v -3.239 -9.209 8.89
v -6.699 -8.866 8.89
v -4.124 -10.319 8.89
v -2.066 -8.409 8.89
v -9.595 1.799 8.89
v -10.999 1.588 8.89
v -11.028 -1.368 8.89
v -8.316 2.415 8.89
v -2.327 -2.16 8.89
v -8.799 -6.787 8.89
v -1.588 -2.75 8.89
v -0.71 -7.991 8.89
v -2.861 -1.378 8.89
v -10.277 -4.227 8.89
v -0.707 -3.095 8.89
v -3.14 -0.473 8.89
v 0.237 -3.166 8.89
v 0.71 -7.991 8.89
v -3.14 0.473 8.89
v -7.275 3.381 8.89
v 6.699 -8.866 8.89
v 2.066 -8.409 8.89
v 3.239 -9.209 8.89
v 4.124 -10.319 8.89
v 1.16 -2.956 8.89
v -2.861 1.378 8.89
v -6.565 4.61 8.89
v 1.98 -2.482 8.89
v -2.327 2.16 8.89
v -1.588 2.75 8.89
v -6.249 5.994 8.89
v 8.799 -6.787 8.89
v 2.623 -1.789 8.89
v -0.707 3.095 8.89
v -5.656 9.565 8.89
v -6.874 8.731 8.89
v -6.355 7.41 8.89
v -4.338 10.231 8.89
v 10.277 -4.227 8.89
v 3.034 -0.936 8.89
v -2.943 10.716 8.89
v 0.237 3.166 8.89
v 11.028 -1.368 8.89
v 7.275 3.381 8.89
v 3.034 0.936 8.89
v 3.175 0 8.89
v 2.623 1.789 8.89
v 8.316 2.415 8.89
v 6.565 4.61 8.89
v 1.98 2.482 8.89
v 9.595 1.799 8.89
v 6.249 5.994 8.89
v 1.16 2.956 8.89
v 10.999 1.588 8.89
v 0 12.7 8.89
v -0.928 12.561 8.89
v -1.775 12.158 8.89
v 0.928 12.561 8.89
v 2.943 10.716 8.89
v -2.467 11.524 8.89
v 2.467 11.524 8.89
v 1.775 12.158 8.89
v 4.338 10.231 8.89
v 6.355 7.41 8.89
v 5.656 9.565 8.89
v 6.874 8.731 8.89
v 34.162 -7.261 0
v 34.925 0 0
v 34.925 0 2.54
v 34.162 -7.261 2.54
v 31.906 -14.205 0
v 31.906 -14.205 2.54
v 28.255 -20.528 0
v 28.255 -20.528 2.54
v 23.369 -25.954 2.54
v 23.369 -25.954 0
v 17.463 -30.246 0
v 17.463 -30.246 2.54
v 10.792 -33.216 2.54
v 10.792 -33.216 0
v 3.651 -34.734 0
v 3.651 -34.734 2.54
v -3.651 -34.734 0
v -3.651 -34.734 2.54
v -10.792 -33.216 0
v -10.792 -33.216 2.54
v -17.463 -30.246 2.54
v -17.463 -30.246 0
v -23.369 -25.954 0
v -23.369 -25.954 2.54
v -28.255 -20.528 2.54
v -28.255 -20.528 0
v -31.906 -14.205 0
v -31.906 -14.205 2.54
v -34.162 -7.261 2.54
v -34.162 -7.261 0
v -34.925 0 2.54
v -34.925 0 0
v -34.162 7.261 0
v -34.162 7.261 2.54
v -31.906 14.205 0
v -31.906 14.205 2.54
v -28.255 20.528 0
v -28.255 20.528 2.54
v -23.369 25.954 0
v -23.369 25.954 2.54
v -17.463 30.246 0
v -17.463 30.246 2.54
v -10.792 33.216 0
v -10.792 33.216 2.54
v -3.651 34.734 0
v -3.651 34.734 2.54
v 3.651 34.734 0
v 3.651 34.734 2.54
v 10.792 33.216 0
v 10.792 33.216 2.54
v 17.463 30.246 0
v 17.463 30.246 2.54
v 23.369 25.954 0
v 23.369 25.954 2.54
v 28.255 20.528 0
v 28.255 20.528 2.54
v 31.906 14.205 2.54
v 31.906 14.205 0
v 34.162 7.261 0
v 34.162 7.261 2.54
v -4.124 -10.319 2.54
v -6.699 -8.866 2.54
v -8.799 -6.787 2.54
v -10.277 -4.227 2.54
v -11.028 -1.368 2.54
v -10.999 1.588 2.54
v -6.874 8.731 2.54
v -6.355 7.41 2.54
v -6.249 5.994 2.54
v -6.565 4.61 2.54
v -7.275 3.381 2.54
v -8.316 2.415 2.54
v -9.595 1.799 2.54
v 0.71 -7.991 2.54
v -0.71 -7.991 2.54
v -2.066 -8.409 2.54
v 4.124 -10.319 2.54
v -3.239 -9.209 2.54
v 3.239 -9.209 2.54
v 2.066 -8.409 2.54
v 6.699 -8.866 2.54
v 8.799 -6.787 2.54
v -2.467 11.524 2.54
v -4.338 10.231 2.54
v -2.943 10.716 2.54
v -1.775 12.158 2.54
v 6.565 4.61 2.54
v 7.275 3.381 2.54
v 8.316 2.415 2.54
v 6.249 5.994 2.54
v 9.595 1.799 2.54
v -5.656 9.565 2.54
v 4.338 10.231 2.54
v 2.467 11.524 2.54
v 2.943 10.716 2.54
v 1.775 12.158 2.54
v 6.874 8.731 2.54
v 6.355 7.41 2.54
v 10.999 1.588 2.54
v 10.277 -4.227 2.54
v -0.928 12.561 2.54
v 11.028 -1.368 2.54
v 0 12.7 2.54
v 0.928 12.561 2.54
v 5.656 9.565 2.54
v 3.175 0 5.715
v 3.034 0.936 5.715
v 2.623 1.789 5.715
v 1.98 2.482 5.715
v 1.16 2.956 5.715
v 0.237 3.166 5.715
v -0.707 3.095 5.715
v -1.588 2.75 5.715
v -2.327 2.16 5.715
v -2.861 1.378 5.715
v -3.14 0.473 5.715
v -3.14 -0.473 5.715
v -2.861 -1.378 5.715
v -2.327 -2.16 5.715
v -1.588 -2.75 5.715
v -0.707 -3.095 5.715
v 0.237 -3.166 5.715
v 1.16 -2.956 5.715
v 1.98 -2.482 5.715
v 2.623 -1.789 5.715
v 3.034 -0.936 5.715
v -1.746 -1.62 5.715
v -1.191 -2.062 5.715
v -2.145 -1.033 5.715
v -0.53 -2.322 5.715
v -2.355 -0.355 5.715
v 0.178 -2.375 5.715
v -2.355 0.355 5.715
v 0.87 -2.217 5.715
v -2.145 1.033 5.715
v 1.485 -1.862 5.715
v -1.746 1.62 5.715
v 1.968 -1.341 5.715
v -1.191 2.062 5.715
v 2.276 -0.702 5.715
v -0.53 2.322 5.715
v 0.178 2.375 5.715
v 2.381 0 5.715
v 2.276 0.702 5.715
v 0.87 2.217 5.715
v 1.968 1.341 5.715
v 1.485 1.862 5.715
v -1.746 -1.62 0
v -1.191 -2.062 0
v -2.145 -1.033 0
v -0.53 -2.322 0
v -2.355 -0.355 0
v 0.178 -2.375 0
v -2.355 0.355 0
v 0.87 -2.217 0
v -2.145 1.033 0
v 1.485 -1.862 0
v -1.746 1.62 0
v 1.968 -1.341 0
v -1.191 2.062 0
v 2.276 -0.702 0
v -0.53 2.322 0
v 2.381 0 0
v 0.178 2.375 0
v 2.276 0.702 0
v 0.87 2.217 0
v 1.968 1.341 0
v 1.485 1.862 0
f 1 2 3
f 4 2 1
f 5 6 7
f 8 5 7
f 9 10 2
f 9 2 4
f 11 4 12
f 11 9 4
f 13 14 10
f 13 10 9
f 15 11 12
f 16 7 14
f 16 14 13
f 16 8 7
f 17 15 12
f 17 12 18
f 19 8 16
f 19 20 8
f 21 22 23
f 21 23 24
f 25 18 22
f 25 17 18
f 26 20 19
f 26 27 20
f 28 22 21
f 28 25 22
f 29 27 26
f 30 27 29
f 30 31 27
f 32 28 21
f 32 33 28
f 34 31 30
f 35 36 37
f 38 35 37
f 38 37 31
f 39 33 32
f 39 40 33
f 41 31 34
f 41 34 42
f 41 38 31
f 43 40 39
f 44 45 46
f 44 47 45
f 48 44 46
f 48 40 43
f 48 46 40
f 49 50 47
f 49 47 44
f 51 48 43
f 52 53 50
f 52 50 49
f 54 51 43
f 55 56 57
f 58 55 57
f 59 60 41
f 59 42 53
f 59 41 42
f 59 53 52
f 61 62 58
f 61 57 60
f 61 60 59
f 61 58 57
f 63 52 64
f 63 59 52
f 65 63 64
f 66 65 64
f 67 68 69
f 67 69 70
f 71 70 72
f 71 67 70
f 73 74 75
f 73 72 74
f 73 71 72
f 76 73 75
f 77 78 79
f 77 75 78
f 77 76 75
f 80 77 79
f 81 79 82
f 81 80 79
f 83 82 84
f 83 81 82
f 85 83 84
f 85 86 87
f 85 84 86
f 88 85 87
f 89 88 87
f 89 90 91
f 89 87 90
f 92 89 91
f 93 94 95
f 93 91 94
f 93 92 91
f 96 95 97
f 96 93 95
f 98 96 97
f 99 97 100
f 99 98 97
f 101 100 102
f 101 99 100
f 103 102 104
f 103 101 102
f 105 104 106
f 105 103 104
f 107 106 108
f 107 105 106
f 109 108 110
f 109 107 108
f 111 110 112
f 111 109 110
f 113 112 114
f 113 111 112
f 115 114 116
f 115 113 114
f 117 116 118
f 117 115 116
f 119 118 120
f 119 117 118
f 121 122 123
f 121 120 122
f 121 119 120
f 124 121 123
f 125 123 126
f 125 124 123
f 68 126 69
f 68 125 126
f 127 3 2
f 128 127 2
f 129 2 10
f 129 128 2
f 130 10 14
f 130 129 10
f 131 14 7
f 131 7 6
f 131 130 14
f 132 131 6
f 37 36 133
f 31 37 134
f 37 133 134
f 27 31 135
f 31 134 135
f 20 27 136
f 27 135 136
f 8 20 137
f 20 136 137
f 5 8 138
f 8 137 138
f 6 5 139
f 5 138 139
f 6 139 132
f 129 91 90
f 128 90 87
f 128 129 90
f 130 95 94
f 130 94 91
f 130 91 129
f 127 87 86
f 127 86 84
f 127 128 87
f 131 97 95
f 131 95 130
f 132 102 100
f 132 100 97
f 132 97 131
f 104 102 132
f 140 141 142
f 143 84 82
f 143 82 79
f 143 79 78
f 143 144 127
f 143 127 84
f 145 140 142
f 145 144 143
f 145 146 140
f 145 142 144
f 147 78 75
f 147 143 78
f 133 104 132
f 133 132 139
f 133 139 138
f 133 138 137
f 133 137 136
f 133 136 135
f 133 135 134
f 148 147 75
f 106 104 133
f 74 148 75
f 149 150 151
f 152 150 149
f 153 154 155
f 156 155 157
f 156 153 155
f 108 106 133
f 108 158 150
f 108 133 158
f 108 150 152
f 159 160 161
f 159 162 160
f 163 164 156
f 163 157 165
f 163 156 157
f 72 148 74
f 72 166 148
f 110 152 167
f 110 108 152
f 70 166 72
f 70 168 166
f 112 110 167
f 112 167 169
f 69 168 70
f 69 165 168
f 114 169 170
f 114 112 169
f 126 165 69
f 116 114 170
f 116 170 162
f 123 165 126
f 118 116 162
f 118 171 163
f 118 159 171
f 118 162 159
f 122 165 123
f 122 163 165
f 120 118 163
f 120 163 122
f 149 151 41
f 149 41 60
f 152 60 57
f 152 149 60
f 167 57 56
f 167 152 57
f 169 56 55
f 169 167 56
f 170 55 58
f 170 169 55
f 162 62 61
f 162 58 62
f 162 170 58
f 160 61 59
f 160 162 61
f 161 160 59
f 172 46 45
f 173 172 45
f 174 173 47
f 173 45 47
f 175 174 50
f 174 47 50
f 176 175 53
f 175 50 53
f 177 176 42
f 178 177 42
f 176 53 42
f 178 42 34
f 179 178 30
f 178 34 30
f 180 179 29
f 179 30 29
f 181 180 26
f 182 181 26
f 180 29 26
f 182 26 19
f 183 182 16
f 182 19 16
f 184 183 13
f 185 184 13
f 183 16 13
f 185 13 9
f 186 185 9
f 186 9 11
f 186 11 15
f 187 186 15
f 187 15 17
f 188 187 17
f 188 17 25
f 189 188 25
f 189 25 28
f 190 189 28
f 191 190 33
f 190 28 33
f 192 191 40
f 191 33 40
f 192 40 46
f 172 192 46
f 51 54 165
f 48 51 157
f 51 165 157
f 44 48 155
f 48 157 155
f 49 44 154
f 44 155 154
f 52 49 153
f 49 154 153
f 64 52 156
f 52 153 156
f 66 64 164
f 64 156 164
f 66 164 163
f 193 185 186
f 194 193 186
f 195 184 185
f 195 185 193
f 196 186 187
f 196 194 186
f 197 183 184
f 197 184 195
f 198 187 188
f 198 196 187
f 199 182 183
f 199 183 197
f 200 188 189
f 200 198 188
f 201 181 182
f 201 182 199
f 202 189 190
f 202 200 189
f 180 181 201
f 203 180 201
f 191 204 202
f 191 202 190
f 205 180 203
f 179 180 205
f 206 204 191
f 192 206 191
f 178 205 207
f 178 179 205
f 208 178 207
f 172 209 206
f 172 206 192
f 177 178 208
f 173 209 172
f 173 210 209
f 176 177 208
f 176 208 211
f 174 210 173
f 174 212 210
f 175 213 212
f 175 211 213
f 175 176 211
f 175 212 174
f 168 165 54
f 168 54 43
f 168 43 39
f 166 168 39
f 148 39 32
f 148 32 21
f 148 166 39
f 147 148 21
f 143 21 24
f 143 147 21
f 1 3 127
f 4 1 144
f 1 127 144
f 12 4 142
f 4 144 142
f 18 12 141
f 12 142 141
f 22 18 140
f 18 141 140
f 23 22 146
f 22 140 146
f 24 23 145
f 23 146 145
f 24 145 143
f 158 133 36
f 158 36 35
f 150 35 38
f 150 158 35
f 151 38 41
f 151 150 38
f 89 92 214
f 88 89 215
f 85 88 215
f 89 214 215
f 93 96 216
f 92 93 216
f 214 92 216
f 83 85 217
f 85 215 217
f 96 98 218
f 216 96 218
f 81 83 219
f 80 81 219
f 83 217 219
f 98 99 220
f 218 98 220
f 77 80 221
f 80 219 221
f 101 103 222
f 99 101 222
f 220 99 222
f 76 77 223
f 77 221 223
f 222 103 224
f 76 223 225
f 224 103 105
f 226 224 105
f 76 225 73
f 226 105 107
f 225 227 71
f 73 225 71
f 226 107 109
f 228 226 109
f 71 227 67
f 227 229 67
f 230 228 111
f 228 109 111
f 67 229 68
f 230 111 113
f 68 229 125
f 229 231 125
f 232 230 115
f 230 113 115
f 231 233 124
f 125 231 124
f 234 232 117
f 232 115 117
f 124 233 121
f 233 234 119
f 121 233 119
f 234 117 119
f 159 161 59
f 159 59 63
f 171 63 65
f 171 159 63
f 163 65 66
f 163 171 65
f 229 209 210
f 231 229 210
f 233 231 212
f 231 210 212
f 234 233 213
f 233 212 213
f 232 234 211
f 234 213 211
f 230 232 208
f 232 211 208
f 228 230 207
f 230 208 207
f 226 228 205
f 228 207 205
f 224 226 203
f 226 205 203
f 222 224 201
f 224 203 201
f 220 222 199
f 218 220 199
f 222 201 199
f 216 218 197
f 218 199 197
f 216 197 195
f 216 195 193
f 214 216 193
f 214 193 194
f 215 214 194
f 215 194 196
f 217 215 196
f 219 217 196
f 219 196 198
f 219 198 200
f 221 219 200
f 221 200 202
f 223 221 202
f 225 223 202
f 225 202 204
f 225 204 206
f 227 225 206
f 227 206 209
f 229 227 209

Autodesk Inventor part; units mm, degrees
ref_plane "YZ Plane" through (0, 0, 0) normal (1, 0, 0) x (0, 1, 0)
ref_plane "XZ Plane" through (0, 0, 0) normal (0, 1, 0) x (-1, 0, 0)
ref_plane "XY Plane" through (0, 0, 0) normal (0, 0, 1) x (1, 0, 0)
sketch "Sketch1" plane through (0, 0, 0) normal (0, 0, 1) x (1, 0, 0)
  circle A0 centre (0, 0) radius 34.925
  dimension "d0" = 69.85
extrude "Extrusion1" add sketch "Sketch1" along normal blind 2.54
sketch "Sketch2" plane through (0, 0, 2.54) normal (0, 0, 1) x (1, 0, 0)
  circle A0 centre (0, 0) radius 11.1125
  line L0 (0, 0) -> (0, -12.7)
  circle A1 centre (0, -12.7) radius 4.7625
  circle A2 centre (10.9985, 6.35) radius 4.7625
  circle A3 centre (-10.9985, 6.35) radius 4.7625
  dimension "d3" = 22.225
  dimension "d4" = 12.7
  dimension "d5" = 9.525
  dimension "d8" = 360
extrude "Extrusion2" add sketch "Sketch2" along normal blind 6.35 contours A0 A1 A3 A2 | A2 A0 | A0 L0 A1 | A0 A1 L0 | A3 A0 picked at (9.3538, 3.9651) picked at (-8.1265, 6.0404)
extrude "Extrusion3" cut sketch "Sketch2" along normal blind 6.35 contours A2 A0 | A0 A2 | A1 A0 | A0 L0 A1 | A0 A1 L0 | A3 A0 | A0 A3
sketch "Sketch3" plane through (0, 0, 2.54) normal (0, 0, 1) x (1, 0, 0)
  line L0 (0, 0) -> (0, 9.525)
  circle A0 centre (0, 9.525) radius 3.175
  dimension "d14" = 9.525
  dimension "d15" = 6.35
extrude "Extrusion4" add sketch "Sketch3" along normal blind 6.35
sketch "Sketch4" plane through (0, 0, 8.89) normal (0, 0, 1) x (1, 0, 0)
  circle A0 centre (0, 0) radius 3.175
  circle A1 centre (0, 0) radius 2.3813
  dimension "d18" = 6.35
  dimension "d19" = 4.7625
extrude "Extrusion5" cut sketch "Sketch4" against normal blind 3.175 contours A0 | A1
extrude "Extrusion6" cut sketch "Sketch4" against normal through all contours A1
properties part number "SpoolEndSpurSide" material "ABS Plastic"
